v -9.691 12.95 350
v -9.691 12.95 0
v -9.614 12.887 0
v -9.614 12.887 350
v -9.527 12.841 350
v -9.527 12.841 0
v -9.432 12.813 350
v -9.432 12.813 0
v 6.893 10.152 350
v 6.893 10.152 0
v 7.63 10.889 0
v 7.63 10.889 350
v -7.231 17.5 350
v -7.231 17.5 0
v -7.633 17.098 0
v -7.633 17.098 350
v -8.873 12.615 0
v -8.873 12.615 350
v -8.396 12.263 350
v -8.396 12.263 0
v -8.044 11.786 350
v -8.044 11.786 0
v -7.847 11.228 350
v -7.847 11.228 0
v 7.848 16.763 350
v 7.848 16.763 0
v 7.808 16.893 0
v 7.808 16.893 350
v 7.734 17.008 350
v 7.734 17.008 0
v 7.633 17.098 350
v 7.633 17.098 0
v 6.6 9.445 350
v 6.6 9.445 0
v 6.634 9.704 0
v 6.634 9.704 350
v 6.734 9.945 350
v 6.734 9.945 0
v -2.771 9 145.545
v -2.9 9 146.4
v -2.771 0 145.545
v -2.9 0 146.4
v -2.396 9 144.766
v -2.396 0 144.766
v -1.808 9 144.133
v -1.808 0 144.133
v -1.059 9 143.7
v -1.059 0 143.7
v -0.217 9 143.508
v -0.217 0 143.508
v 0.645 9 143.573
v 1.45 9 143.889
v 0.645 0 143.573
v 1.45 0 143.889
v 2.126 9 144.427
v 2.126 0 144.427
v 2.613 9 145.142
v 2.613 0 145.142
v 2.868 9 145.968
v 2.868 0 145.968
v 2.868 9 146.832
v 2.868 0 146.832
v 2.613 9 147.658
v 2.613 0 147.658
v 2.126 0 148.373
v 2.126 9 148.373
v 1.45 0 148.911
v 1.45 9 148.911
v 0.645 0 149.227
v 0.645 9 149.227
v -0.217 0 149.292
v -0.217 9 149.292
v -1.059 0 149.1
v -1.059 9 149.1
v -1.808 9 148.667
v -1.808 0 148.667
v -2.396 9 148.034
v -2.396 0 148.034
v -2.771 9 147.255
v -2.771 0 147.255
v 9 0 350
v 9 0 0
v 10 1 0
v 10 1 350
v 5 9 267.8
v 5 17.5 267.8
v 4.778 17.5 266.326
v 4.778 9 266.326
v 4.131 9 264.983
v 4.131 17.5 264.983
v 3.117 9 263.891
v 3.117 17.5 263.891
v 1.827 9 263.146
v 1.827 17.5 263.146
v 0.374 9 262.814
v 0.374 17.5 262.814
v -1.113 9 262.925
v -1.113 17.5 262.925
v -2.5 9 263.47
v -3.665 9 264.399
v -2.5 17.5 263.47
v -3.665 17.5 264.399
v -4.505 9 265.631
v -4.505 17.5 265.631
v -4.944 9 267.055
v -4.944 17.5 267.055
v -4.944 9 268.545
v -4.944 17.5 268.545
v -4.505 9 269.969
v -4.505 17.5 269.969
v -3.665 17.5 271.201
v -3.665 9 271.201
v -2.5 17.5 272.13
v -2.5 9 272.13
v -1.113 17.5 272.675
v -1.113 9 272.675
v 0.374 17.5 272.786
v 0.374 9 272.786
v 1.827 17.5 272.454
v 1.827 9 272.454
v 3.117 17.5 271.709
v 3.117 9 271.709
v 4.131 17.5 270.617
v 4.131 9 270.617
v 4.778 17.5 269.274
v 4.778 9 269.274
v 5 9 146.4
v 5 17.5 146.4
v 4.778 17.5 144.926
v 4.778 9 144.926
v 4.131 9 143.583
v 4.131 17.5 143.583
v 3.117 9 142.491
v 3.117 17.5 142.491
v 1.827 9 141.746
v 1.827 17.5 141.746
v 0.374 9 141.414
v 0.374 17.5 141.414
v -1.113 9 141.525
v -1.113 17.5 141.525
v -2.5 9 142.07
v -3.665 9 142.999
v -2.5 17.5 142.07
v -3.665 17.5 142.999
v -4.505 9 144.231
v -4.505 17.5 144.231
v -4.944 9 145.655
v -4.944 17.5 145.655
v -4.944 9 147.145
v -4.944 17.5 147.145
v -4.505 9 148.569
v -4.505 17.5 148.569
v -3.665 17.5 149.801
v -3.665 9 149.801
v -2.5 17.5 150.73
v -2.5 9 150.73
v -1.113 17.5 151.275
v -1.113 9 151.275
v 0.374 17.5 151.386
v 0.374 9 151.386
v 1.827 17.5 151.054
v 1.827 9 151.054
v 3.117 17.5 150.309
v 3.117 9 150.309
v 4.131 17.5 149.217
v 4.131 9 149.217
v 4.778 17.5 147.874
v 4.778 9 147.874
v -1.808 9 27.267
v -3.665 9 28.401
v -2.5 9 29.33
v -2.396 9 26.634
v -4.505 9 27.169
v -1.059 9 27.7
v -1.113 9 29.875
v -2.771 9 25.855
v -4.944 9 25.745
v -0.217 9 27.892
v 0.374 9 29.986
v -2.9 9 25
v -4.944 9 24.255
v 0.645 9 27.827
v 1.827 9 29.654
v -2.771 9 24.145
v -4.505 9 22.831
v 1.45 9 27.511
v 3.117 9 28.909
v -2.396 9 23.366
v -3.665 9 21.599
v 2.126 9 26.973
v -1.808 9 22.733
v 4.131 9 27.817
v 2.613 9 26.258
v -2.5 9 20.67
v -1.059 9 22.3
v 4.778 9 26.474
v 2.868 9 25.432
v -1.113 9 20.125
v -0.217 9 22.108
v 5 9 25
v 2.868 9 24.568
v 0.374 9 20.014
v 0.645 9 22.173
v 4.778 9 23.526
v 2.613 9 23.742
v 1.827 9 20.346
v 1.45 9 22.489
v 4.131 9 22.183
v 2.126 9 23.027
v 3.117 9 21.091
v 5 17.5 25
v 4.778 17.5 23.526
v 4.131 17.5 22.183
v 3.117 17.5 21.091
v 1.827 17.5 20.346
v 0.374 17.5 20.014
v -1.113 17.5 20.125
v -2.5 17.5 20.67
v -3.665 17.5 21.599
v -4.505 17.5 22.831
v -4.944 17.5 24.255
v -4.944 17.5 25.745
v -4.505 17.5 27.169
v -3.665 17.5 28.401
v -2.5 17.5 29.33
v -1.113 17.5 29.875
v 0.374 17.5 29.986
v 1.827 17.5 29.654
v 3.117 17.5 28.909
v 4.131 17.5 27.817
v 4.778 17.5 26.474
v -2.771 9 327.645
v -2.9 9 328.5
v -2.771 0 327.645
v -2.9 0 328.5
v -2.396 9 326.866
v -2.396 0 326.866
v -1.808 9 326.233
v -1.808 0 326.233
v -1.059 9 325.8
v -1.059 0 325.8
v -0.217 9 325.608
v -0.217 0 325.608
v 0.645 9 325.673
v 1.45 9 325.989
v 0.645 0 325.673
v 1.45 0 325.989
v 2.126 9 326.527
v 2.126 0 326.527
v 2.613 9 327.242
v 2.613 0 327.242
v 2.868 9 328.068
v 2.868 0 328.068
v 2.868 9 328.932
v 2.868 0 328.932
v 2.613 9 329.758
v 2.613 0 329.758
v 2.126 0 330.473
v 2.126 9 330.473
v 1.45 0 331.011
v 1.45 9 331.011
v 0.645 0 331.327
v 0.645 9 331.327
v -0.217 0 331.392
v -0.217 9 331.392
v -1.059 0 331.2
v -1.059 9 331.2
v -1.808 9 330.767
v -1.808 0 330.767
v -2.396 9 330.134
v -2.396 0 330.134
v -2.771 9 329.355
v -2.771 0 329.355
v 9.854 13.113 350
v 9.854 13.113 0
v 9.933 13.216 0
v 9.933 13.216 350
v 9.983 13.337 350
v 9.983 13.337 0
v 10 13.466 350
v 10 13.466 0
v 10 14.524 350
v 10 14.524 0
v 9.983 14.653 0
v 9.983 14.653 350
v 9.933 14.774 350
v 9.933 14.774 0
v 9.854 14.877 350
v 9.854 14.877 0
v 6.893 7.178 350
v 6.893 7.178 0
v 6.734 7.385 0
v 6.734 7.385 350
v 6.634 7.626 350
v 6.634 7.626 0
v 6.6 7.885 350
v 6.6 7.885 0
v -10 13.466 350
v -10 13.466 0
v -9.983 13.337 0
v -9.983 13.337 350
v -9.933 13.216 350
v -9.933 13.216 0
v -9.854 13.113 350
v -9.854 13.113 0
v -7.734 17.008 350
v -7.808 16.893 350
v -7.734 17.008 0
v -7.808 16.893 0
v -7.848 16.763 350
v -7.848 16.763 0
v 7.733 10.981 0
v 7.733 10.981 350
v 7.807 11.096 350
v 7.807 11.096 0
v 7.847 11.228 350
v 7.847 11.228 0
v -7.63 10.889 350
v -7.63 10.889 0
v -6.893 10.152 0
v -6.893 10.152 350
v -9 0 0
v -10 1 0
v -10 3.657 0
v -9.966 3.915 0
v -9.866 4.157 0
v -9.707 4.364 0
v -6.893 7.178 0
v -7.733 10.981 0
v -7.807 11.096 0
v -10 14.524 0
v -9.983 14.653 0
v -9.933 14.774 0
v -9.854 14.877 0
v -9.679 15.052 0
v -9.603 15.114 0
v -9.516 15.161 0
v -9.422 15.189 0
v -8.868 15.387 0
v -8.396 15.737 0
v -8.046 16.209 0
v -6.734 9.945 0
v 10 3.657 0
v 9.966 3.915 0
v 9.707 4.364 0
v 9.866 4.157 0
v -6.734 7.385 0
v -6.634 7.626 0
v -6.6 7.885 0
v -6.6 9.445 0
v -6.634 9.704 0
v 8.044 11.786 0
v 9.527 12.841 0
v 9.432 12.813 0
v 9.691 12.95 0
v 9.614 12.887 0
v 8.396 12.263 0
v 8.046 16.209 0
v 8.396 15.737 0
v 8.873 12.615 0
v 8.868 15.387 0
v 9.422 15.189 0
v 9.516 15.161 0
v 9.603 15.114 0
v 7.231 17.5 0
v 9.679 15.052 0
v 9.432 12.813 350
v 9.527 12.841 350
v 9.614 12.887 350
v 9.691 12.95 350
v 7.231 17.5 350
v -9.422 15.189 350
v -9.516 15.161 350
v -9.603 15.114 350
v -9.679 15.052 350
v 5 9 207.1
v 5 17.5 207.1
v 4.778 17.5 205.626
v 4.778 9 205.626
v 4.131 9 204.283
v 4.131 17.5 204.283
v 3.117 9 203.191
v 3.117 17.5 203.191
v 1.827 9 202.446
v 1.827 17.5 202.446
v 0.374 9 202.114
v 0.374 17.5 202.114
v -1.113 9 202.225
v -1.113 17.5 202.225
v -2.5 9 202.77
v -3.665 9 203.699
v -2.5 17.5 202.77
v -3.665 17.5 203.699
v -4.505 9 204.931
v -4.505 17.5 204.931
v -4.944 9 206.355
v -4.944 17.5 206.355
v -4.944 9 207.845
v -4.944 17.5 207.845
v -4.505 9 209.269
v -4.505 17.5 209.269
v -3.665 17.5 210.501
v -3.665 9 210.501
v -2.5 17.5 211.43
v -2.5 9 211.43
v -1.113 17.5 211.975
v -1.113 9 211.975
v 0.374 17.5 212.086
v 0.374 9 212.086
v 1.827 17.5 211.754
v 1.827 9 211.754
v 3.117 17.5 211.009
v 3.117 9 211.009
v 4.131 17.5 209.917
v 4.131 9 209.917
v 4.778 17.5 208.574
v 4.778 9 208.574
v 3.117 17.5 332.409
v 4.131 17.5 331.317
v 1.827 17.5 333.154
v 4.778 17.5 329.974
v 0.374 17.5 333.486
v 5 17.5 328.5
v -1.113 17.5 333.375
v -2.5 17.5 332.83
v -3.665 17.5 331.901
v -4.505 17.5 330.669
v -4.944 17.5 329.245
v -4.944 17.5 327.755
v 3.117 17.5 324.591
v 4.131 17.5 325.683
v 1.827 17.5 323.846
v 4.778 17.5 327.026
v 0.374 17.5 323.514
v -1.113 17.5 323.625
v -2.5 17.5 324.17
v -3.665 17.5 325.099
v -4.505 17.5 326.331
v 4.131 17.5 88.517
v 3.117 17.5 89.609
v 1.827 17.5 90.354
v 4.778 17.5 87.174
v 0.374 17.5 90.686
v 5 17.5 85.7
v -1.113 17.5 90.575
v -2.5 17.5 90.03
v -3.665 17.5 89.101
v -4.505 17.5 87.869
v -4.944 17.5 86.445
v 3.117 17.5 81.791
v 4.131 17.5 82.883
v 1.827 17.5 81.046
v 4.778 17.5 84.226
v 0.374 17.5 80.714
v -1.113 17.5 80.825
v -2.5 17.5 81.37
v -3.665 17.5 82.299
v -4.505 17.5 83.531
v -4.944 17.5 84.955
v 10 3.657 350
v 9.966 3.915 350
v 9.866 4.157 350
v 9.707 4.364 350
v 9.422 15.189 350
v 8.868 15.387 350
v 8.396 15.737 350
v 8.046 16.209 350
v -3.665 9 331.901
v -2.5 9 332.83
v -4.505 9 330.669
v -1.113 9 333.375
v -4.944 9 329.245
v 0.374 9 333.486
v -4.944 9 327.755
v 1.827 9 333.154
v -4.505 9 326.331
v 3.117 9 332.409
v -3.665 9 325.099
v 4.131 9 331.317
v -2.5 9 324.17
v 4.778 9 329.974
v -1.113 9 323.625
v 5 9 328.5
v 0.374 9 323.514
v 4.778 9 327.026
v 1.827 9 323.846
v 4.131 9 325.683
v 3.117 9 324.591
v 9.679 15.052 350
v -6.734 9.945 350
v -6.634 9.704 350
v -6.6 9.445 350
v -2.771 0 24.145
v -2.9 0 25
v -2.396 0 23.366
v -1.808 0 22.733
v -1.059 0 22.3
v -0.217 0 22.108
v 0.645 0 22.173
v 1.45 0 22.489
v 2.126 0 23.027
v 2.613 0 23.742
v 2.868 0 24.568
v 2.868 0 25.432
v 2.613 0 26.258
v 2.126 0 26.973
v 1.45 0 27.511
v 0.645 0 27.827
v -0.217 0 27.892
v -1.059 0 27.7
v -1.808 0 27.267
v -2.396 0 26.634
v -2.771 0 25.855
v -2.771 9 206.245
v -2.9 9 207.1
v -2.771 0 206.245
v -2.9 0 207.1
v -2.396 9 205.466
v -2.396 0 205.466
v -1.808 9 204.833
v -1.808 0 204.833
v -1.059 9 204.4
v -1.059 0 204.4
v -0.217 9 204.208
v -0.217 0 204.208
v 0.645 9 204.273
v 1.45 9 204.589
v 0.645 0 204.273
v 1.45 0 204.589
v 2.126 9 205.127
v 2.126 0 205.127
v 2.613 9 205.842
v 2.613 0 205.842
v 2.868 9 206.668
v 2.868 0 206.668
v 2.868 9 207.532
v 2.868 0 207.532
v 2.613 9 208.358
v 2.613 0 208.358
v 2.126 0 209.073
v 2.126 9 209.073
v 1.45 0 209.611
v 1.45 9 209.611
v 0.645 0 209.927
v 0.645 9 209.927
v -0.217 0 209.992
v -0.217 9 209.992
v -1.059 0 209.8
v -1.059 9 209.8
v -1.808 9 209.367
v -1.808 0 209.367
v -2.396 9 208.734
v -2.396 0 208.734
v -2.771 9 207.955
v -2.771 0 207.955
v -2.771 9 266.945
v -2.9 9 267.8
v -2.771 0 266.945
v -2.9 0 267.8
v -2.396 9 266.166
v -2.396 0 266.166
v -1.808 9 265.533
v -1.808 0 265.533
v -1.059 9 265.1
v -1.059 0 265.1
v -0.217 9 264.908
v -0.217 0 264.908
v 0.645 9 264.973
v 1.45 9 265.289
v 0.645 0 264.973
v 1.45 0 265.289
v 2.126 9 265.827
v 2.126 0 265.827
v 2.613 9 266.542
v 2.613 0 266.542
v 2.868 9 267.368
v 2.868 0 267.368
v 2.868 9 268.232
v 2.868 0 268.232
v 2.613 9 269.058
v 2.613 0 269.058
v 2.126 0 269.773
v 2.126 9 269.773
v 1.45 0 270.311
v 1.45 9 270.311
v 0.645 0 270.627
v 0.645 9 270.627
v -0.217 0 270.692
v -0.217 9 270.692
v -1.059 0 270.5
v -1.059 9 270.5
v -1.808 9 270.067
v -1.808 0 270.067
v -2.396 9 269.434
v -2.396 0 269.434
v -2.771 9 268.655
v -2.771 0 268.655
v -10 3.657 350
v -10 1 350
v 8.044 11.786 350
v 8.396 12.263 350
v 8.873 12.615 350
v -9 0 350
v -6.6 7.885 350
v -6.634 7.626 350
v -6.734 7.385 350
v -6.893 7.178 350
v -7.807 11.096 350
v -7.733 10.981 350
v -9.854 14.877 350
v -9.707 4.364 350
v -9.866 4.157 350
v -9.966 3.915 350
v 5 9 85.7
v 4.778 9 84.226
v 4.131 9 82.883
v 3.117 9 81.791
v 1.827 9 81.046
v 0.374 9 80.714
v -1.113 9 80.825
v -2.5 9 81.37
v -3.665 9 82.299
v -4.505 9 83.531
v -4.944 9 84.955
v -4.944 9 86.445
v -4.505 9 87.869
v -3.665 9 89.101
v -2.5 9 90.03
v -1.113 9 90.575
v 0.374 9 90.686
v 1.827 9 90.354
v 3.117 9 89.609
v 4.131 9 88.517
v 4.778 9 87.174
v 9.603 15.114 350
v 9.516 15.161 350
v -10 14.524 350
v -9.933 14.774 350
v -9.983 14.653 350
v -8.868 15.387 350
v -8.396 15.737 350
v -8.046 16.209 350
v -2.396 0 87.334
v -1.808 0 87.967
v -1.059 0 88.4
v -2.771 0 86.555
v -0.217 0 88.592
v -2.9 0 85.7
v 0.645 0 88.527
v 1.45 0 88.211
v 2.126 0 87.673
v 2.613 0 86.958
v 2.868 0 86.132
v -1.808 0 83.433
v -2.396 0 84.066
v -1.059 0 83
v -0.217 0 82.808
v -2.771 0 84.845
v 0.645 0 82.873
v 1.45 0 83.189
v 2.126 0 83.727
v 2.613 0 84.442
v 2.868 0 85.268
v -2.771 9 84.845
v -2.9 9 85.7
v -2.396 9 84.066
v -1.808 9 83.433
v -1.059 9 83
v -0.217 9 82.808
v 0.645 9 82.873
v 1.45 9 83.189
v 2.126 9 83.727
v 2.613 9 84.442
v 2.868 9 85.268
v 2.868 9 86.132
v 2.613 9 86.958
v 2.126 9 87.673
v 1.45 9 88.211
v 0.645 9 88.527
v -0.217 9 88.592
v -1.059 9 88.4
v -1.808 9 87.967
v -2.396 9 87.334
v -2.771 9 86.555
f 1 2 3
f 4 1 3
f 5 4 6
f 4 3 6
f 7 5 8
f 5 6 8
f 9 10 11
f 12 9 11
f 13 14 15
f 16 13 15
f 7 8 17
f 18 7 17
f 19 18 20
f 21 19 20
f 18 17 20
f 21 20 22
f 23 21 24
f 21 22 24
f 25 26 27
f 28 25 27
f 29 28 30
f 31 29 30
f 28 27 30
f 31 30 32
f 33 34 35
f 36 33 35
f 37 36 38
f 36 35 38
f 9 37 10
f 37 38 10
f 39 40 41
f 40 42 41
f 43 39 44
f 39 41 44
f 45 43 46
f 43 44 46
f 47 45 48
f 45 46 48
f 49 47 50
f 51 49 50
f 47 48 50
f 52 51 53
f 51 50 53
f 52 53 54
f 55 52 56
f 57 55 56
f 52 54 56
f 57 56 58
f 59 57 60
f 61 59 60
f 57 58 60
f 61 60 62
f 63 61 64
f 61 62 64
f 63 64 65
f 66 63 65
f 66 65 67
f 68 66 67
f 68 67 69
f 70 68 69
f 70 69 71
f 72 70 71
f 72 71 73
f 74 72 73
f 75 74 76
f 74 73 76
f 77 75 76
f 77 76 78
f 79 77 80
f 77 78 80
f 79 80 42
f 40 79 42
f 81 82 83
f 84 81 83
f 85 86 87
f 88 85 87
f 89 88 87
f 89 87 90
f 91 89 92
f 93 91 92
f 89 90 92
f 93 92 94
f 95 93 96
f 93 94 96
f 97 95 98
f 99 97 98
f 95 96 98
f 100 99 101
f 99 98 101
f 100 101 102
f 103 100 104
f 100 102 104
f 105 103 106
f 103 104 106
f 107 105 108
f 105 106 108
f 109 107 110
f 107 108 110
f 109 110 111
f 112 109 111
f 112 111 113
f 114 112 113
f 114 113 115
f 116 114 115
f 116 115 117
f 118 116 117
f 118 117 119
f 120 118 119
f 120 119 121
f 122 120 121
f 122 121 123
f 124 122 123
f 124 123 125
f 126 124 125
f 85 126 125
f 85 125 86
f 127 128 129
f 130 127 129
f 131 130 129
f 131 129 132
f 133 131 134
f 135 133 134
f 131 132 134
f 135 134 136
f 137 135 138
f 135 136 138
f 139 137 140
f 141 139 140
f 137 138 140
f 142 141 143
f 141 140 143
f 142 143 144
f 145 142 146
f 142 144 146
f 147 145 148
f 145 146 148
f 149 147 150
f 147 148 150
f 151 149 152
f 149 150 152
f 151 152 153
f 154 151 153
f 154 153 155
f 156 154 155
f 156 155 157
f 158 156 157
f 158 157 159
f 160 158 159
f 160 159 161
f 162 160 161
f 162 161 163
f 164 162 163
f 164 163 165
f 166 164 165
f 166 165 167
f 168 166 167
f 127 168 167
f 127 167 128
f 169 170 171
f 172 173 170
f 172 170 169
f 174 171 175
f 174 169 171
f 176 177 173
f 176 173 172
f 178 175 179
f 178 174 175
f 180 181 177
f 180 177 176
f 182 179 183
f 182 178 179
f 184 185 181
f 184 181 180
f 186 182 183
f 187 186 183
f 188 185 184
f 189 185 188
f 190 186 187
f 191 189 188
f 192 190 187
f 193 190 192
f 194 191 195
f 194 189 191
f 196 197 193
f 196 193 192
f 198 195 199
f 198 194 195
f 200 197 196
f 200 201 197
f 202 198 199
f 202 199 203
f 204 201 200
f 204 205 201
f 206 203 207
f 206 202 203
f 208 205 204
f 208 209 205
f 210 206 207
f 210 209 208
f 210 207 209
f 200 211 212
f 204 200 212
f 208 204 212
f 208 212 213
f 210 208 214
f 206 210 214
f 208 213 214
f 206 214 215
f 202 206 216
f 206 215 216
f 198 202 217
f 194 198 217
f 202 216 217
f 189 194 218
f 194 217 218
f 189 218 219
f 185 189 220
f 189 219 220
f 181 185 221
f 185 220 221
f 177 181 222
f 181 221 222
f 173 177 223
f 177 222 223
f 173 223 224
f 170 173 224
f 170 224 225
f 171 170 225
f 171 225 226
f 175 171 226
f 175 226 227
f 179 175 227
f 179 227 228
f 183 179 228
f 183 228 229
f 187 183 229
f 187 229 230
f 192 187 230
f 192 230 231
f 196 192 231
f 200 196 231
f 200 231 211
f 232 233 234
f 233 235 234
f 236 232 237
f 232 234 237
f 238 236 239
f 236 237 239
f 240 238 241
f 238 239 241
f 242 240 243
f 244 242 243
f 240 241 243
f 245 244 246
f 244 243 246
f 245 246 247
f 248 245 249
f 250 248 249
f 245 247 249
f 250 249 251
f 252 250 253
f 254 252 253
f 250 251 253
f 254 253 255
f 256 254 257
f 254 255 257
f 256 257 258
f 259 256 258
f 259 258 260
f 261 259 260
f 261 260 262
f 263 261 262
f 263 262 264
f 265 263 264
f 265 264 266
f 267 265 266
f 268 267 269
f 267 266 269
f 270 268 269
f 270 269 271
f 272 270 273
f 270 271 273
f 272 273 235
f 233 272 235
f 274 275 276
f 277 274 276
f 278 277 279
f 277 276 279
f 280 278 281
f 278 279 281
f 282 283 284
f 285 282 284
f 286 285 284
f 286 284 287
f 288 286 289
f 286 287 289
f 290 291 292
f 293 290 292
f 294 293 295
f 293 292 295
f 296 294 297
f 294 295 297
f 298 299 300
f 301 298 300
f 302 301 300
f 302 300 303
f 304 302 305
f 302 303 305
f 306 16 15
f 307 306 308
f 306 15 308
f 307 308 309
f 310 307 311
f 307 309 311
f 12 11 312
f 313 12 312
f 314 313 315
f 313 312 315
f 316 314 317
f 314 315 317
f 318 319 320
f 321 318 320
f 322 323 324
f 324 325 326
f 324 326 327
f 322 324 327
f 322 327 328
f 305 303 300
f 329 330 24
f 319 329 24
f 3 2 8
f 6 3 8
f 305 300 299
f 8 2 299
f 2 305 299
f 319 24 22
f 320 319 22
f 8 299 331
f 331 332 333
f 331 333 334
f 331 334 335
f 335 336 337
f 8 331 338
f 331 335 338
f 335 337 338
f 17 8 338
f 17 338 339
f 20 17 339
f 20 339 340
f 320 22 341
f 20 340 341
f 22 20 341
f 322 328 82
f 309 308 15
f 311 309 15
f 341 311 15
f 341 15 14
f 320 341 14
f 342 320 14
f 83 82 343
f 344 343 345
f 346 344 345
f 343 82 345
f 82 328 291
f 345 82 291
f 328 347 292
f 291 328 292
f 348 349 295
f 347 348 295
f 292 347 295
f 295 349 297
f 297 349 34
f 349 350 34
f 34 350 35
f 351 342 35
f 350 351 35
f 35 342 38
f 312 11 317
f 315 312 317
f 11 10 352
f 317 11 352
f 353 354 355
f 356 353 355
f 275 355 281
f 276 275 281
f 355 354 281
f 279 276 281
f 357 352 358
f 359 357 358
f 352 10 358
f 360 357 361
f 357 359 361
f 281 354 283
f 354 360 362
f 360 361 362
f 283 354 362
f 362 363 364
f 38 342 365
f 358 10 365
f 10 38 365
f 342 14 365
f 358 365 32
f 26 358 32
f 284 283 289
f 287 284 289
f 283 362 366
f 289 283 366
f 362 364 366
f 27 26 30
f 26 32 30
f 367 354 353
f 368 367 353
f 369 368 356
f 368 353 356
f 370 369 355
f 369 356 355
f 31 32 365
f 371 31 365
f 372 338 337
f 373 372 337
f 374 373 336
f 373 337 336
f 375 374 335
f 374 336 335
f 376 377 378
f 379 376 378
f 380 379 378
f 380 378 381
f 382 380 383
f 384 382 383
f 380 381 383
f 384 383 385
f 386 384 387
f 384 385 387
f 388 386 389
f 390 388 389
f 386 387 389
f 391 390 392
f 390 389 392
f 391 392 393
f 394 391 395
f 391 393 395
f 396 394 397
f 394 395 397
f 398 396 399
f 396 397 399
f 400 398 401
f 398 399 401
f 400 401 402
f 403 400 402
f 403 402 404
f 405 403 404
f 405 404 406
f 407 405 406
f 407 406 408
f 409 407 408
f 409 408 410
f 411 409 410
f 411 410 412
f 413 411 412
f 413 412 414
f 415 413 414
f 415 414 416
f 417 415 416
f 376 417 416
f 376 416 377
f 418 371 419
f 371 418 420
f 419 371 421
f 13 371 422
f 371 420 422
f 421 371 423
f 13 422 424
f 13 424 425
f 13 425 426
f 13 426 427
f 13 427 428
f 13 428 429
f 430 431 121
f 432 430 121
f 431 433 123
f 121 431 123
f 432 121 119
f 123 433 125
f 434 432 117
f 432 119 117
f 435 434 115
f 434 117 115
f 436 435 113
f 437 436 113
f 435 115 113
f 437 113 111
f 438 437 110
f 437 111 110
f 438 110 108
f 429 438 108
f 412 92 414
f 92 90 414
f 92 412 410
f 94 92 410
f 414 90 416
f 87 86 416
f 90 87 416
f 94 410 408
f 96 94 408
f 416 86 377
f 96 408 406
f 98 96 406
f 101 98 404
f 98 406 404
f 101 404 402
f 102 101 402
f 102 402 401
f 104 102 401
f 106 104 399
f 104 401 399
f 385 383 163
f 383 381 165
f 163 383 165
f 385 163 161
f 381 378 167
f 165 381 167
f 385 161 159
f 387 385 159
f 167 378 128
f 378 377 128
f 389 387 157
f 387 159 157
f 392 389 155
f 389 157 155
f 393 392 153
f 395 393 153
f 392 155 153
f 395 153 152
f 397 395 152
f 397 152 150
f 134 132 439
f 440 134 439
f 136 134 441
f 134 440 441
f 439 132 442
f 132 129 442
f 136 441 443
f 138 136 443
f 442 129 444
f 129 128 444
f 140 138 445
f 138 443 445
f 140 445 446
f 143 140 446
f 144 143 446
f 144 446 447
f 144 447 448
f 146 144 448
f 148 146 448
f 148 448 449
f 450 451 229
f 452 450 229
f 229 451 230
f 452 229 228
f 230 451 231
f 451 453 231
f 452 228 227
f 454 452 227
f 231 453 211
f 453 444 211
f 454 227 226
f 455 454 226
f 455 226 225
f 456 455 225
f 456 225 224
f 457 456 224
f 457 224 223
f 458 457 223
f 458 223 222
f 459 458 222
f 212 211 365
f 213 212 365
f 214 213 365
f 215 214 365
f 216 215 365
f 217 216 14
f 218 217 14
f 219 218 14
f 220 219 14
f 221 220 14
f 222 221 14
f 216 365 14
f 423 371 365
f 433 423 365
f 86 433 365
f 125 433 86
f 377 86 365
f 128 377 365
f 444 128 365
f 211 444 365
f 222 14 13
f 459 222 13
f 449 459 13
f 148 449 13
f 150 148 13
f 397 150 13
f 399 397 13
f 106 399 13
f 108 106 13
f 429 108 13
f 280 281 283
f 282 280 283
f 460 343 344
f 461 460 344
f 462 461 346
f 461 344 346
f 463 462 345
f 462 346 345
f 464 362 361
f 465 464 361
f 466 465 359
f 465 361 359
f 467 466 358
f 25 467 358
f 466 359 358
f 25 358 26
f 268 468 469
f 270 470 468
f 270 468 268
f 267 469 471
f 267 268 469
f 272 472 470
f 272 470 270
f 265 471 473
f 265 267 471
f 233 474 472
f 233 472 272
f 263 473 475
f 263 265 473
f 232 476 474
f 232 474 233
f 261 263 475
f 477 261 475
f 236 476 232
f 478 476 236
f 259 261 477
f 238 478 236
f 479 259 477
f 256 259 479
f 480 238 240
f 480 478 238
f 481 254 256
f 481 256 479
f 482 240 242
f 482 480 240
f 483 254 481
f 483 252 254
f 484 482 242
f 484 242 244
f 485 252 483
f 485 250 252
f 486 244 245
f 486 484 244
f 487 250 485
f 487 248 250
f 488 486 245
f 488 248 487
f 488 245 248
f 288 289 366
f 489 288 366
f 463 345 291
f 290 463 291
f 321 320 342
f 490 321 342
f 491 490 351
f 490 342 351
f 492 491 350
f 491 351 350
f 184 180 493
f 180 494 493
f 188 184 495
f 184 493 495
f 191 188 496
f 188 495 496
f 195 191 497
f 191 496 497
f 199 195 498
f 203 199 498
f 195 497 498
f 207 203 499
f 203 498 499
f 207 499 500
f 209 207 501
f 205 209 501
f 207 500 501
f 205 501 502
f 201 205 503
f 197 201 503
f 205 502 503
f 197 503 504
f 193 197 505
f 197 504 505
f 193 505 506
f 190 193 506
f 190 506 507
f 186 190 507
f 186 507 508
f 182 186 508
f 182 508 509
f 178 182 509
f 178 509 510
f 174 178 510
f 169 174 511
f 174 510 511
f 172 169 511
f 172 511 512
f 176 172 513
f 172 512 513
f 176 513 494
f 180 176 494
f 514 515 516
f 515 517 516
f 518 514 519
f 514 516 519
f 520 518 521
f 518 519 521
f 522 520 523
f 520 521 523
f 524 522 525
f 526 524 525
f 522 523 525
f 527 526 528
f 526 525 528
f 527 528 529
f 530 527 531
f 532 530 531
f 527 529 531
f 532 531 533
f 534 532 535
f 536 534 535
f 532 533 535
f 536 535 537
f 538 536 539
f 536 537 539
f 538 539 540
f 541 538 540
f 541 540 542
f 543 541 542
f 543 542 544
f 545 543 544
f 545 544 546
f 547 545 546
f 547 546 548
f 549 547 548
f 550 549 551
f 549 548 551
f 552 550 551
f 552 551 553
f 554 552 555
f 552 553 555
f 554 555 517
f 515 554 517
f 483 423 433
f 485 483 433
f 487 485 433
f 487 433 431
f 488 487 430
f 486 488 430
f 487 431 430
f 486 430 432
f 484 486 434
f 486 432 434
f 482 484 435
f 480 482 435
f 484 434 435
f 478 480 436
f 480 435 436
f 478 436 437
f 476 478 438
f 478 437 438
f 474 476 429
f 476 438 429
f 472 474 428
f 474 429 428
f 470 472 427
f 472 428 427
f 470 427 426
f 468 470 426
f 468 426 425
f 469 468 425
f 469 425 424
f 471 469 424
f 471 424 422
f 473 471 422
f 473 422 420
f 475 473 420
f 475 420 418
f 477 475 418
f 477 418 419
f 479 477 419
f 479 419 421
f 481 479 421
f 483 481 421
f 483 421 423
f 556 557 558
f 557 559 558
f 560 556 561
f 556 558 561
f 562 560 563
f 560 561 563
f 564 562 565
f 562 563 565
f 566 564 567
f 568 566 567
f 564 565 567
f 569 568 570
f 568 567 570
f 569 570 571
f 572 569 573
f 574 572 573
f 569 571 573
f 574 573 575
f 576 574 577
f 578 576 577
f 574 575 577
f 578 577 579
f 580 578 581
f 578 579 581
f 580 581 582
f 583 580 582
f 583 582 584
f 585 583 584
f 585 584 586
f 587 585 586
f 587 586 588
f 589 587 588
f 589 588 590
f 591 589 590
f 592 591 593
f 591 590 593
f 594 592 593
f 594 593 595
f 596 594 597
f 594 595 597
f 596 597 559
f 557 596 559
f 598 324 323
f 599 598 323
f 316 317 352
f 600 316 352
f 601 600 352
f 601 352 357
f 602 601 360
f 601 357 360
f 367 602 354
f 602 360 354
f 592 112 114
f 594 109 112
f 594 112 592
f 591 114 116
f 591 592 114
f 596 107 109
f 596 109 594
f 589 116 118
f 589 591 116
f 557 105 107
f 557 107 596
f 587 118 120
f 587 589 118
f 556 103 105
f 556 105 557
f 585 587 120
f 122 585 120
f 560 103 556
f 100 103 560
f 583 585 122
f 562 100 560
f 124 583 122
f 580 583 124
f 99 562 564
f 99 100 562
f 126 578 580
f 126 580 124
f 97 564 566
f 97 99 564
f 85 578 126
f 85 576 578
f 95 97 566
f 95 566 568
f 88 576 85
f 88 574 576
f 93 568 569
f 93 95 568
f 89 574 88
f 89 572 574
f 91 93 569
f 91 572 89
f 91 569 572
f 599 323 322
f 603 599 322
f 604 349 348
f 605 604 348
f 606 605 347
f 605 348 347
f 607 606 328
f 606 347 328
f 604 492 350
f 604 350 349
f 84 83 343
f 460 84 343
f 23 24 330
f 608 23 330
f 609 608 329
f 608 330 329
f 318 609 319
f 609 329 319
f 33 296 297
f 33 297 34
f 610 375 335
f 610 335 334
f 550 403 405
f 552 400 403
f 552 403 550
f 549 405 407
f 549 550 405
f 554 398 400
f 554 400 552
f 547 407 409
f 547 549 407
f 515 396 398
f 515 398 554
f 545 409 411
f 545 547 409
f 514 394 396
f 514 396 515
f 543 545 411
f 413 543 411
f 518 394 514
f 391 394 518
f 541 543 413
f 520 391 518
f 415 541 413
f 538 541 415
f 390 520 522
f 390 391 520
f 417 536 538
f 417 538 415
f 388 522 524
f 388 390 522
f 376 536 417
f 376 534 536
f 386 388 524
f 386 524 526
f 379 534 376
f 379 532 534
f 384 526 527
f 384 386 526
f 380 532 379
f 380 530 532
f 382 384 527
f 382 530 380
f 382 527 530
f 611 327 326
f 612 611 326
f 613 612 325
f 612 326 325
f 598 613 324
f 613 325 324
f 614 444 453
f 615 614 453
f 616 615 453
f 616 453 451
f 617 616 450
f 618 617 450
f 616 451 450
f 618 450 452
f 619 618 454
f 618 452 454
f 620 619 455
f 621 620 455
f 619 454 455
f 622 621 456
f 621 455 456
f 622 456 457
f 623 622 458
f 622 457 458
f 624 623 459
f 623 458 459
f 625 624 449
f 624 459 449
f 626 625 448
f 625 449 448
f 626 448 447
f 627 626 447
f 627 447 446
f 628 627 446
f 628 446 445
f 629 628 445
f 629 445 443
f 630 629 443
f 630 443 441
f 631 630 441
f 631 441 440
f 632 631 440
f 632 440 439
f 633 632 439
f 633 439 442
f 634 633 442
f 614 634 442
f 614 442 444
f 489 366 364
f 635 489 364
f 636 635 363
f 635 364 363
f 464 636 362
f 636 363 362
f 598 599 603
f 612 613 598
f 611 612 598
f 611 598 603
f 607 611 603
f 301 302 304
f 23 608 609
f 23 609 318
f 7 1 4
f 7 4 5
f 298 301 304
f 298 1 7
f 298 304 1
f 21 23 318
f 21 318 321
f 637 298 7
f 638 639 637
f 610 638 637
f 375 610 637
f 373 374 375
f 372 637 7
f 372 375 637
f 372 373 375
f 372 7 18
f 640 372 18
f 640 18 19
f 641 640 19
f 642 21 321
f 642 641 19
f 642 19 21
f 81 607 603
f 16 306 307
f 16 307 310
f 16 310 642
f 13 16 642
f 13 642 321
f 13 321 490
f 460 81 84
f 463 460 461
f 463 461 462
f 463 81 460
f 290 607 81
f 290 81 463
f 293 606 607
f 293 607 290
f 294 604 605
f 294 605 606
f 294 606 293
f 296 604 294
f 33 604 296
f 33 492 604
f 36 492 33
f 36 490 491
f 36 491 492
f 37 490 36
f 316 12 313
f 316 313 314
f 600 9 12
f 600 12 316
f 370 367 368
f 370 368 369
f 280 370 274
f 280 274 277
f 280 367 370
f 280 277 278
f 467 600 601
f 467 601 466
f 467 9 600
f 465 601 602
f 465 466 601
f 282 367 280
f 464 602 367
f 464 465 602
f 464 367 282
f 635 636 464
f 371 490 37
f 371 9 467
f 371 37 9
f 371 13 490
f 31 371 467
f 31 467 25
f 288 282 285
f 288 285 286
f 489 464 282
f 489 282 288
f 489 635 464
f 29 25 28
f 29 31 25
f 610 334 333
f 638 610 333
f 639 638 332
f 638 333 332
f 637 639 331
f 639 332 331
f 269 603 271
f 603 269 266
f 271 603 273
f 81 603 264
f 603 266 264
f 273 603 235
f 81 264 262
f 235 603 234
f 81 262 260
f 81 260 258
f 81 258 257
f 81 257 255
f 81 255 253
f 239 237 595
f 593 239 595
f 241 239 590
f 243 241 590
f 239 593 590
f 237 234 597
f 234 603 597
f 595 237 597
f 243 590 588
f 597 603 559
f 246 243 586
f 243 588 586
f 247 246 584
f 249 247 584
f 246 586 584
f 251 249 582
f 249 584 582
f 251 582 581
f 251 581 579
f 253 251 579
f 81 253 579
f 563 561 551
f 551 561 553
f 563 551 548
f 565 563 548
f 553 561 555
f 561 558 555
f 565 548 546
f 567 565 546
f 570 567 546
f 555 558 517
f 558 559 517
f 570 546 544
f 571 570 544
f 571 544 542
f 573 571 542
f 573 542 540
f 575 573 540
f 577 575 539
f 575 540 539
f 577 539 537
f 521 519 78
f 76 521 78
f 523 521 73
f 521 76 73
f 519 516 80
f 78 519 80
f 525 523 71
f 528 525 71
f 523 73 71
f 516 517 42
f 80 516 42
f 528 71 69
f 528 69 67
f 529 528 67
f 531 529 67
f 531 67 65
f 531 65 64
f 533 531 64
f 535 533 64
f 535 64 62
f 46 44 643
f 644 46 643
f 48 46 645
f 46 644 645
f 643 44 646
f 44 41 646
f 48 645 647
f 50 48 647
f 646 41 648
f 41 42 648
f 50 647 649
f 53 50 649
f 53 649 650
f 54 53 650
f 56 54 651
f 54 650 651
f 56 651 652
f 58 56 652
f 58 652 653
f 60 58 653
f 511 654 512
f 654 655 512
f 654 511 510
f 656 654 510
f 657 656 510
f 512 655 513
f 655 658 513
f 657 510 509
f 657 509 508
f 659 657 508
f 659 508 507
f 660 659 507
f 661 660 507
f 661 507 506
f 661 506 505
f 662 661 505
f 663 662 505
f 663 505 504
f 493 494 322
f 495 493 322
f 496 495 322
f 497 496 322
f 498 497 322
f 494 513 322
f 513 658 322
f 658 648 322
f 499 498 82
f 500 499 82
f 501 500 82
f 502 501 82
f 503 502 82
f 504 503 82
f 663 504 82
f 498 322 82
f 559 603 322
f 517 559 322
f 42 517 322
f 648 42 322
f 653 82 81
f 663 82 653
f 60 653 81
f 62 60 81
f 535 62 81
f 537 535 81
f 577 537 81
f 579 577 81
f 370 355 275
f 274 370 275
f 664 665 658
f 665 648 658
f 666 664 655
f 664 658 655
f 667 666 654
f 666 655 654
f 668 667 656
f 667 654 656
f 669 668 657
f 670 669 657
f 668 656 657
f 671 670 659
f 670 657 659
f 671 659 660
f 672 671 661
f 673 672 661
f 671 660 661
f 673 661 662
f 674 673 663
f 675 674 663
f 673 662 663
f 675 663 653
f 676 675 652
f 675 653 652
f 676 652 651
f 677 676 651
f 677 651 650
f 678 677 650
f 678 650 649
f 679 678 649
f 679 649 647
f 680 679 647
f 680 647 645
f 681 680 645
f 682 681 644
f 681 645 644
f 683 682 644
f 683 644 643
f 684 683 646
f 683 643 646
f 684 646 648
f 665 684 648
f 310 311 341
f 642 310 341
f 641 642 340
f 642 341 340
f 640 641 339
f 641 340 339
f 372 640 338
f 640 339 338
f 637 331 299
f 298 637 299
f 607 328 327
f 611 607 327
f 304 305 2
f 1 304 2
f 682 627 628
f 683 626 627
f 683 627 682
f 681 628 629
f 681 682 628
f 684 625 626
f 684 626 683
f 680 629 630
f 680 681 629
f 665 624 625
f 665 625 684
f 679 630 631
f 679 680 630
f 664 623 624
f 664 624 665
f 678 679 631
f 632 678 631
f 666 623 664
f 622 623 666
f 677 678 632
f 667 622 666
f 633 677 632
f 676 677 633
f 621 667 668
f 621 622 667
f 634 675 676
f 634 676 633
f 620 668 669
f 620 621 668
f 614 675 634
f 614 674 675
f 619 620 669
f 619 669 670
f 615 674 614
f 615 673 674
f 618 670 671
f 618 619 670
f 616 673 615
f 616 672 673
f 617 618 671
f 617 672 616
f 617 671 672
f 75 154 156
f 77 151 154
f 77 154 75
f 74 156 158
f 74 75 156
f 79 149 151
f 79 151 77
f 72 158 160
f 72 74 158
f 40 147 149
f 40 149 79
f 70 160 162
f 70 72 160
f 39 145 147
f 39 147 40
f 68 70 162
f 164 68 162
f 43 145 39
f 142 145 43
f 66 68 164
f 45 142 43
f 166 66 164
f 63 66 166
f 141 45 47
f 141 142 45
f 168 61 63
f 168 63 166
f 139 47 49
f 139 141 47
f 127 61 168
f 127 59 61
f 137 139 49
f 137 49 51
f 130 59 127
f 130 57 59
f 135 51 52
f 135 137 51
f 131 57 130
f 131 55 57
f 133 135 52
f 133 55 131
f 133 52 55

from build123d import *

# Parameters (mm, degrees)
HGR_HGR20_1_DEPTH                                   = 350
CBORE_FOR_M5_HEX_SOCKET_HEAD_CAP_SCREW1_D           = 5.8
CBORE_FOR_M5_HEX_SOCKET_HEAD_CAP_SCREW1_CBORE_D     = 10
CBORE_FOR_M5_HEX_SOCKET_HEAD_CAP_SCREW1_CBORE_DEPTH = 8.5
LPATTERN1_COUNT                                     = 6
LPATTERN1_PITCH                                     = 60.7


with BuildPart() as part:
    # Sketch12 → Hgr HGR20(1) (new body)
    with BuildSketch(Plane.XY):
        with BuildLine():
            Line((-9, 0), (9, 0))
            Line((9, 0), (10, 1))
            Line((10, 1), (10, 3.656507036))
            ThreePointArc((10, 3.656507036), (9.92387953, 4.039190479), (9.707106773, 4.363613837))
            Line((9.707106773, 4.363613837), (6.892893227, 7.177827383))
            ThreePointArc((6.892893227, 7.177827383), (6.67612047, 7.502250741), (6.6, 7.884934184))
            Line((6.6, 7.884934184), (6.6, 9.445065806))
            ThreePointArc((6.6, 9.445065806), (6.67612047, 9.827749249), (6.892893227, 10.152172607))
            Line((6.892893227, 10.152172607), (7.63016236, 10.88944174))
            ThreePointArc((7.63016236, 10.88944174), (7.773916168, 11.035785916), (7.84680643, 11.2275378))
            ThreePointArc((7.84680643, 11.2275378), (8.396388337, 12.262927707), (9.431778248, 12.812509604))
            ThreePointArc((9.431778248, 12.812509604), (9.57149389, 12.861817745), (9.690625667, 12.949905047))
            Line((9.690625667, 12.949905047), (9.85355341, 13.11283279))
            ThreePointArc((9.85355341, 13.11283279), (9.961939771, 13.275044443), (10, 13.466386134))
            Line((10, 13.466386134), (10, 14.523613846))
            ThreePointArc((10, 14.523613846), (9.961939771, 14.714955537), (9.85355341, 14.87716719))
            Line((9.85355341, 14.87716719), (9.678500884, 15.052219716))
            ThreePointArc((9.678500884, 15.052219716), (9.560417671, 15.13974885), (9.421985128, 15.189159636))
            ThreePointArc((9.421985128, 15.189159636), (8.395921997, 15.736919373), (7.84816225, 16.7629825))
            ThreePointArc((7.84816225, 16.7629825), (7.7751915, 16.95300083), (7.63253117, 17.09818942))
            Line((7.63253117, 17.09818942), (7.23072061, 17.49999998))
            Line((7.23072061, 17.49999998), (-7.23072061, 17.49999998))
            Line((-7.23072061, 17.49999998), (-7.63253117, 17.09818942))
            ThreePointArc((-7.63253117, 17.09818942), (-7.775191493, 16.953000826), (-7.84816225, 16.7629825))
            ThreePointArc((-7.84816225, 16.7629825), (-8.395921988, 15.736919382), (-9.421985103, 15.189159641))
            ThreePointArc((-9.421985103, 15.189159641), (-9.560417671, 15.139748844), (-9.678500907, 15.052219693))
            Line((-9.678500907, 15.052219693), (-9.85355341, 14.87716719))
            ThreePointArc((-9.85355341, 14.87716719), (-9.961939771, 14.714955537), (-10, 14.523613846))
            Line((-10, 14.523613846), (-10, 13.466386134))
            ThreePointArc((-10, 13.466386134), (-9.961939771, 13.275044443), (-9.85355341, 13.11283279))
            Line((-9.85355341, 13.11283279), (-9.690625709, 12.949905089))
            ThreePointArc((-9.690625709, 12.949905089), (-9.571493891, 12.861817755), (-9.431778202, 12.812509595))
            ThreePointArc((-9.431778202, 12.812509595), (-8.39638832, 12.26292769), (-7.84680643, 11.2275378))
            ThreePointArc((-7.84680643, 11.2275378), (-7.773916172, 11.035785914), (-7.63016236, 10.88944174))
            Line((-7.63016236, 10.88944174), (-6.892893227, 10.152172607))
            ThreePointArc((-6.892893227, 10.152172607), (-6.67612047, 9.827749249), (-6.6, 9.445065806))
            Line((-6.6, 9.445065806), (-6.6, 7.884934184))
            ThreePointArc((-6.6, 7.884934184), (-6.67612047, 7.502250741), (-6.892893227, 7.177827383))
            Line((-6.892893227, 7.177827383), (-9.707106773, 4.363613837))
            ThreePointArc((-9.707106773, 4.363613837), (-9.92387953, 4.039190479), (-10, 3.656507036))
            Line((-10, 3.656507036), (-10, 1))
            Line((-10, 1), (-9, 0))
        make_face()
    extrude(amount=HGR_HGR20_1_DEPTH)

    # CBORE for M5 Hex Socket Head Cap Screw1 (through all)
    with Locations(Plane(origin=(0, 17.49999998, 0), x_dir=(1, 0, 0), z_dir=(0, 1, 0))):
        with Locations((0, -25)):
            cbore_for_m5_hex_socket_head_cap_screw1 = CounterBoreHole(CBORE_FOR_M5_HEX_SOCKET_HEAD_CAP_SCREW1_D / 2, CBORE_FOR_M5_HEX_SOCKET_HEAD_CAP_SCREW1_CBORE_D / 2, CBORE_FOR_M5_HEX_SOCKET_HEAD_CAP_SCREW1_CBORE_DEPTH)

    # LPattern1: CBORE for M5 Hex Socket Head Cap Screw1 ×6
    with Locations(*[(0, 0, i * LPATTERN1_PITCH) for i in range(1, LPATTERN1_COUNT)]):
        add(cbore_for_m5_hex_socket_head_cap_screw1, mode=Mode.SUBTRACT)


solid = part.part
